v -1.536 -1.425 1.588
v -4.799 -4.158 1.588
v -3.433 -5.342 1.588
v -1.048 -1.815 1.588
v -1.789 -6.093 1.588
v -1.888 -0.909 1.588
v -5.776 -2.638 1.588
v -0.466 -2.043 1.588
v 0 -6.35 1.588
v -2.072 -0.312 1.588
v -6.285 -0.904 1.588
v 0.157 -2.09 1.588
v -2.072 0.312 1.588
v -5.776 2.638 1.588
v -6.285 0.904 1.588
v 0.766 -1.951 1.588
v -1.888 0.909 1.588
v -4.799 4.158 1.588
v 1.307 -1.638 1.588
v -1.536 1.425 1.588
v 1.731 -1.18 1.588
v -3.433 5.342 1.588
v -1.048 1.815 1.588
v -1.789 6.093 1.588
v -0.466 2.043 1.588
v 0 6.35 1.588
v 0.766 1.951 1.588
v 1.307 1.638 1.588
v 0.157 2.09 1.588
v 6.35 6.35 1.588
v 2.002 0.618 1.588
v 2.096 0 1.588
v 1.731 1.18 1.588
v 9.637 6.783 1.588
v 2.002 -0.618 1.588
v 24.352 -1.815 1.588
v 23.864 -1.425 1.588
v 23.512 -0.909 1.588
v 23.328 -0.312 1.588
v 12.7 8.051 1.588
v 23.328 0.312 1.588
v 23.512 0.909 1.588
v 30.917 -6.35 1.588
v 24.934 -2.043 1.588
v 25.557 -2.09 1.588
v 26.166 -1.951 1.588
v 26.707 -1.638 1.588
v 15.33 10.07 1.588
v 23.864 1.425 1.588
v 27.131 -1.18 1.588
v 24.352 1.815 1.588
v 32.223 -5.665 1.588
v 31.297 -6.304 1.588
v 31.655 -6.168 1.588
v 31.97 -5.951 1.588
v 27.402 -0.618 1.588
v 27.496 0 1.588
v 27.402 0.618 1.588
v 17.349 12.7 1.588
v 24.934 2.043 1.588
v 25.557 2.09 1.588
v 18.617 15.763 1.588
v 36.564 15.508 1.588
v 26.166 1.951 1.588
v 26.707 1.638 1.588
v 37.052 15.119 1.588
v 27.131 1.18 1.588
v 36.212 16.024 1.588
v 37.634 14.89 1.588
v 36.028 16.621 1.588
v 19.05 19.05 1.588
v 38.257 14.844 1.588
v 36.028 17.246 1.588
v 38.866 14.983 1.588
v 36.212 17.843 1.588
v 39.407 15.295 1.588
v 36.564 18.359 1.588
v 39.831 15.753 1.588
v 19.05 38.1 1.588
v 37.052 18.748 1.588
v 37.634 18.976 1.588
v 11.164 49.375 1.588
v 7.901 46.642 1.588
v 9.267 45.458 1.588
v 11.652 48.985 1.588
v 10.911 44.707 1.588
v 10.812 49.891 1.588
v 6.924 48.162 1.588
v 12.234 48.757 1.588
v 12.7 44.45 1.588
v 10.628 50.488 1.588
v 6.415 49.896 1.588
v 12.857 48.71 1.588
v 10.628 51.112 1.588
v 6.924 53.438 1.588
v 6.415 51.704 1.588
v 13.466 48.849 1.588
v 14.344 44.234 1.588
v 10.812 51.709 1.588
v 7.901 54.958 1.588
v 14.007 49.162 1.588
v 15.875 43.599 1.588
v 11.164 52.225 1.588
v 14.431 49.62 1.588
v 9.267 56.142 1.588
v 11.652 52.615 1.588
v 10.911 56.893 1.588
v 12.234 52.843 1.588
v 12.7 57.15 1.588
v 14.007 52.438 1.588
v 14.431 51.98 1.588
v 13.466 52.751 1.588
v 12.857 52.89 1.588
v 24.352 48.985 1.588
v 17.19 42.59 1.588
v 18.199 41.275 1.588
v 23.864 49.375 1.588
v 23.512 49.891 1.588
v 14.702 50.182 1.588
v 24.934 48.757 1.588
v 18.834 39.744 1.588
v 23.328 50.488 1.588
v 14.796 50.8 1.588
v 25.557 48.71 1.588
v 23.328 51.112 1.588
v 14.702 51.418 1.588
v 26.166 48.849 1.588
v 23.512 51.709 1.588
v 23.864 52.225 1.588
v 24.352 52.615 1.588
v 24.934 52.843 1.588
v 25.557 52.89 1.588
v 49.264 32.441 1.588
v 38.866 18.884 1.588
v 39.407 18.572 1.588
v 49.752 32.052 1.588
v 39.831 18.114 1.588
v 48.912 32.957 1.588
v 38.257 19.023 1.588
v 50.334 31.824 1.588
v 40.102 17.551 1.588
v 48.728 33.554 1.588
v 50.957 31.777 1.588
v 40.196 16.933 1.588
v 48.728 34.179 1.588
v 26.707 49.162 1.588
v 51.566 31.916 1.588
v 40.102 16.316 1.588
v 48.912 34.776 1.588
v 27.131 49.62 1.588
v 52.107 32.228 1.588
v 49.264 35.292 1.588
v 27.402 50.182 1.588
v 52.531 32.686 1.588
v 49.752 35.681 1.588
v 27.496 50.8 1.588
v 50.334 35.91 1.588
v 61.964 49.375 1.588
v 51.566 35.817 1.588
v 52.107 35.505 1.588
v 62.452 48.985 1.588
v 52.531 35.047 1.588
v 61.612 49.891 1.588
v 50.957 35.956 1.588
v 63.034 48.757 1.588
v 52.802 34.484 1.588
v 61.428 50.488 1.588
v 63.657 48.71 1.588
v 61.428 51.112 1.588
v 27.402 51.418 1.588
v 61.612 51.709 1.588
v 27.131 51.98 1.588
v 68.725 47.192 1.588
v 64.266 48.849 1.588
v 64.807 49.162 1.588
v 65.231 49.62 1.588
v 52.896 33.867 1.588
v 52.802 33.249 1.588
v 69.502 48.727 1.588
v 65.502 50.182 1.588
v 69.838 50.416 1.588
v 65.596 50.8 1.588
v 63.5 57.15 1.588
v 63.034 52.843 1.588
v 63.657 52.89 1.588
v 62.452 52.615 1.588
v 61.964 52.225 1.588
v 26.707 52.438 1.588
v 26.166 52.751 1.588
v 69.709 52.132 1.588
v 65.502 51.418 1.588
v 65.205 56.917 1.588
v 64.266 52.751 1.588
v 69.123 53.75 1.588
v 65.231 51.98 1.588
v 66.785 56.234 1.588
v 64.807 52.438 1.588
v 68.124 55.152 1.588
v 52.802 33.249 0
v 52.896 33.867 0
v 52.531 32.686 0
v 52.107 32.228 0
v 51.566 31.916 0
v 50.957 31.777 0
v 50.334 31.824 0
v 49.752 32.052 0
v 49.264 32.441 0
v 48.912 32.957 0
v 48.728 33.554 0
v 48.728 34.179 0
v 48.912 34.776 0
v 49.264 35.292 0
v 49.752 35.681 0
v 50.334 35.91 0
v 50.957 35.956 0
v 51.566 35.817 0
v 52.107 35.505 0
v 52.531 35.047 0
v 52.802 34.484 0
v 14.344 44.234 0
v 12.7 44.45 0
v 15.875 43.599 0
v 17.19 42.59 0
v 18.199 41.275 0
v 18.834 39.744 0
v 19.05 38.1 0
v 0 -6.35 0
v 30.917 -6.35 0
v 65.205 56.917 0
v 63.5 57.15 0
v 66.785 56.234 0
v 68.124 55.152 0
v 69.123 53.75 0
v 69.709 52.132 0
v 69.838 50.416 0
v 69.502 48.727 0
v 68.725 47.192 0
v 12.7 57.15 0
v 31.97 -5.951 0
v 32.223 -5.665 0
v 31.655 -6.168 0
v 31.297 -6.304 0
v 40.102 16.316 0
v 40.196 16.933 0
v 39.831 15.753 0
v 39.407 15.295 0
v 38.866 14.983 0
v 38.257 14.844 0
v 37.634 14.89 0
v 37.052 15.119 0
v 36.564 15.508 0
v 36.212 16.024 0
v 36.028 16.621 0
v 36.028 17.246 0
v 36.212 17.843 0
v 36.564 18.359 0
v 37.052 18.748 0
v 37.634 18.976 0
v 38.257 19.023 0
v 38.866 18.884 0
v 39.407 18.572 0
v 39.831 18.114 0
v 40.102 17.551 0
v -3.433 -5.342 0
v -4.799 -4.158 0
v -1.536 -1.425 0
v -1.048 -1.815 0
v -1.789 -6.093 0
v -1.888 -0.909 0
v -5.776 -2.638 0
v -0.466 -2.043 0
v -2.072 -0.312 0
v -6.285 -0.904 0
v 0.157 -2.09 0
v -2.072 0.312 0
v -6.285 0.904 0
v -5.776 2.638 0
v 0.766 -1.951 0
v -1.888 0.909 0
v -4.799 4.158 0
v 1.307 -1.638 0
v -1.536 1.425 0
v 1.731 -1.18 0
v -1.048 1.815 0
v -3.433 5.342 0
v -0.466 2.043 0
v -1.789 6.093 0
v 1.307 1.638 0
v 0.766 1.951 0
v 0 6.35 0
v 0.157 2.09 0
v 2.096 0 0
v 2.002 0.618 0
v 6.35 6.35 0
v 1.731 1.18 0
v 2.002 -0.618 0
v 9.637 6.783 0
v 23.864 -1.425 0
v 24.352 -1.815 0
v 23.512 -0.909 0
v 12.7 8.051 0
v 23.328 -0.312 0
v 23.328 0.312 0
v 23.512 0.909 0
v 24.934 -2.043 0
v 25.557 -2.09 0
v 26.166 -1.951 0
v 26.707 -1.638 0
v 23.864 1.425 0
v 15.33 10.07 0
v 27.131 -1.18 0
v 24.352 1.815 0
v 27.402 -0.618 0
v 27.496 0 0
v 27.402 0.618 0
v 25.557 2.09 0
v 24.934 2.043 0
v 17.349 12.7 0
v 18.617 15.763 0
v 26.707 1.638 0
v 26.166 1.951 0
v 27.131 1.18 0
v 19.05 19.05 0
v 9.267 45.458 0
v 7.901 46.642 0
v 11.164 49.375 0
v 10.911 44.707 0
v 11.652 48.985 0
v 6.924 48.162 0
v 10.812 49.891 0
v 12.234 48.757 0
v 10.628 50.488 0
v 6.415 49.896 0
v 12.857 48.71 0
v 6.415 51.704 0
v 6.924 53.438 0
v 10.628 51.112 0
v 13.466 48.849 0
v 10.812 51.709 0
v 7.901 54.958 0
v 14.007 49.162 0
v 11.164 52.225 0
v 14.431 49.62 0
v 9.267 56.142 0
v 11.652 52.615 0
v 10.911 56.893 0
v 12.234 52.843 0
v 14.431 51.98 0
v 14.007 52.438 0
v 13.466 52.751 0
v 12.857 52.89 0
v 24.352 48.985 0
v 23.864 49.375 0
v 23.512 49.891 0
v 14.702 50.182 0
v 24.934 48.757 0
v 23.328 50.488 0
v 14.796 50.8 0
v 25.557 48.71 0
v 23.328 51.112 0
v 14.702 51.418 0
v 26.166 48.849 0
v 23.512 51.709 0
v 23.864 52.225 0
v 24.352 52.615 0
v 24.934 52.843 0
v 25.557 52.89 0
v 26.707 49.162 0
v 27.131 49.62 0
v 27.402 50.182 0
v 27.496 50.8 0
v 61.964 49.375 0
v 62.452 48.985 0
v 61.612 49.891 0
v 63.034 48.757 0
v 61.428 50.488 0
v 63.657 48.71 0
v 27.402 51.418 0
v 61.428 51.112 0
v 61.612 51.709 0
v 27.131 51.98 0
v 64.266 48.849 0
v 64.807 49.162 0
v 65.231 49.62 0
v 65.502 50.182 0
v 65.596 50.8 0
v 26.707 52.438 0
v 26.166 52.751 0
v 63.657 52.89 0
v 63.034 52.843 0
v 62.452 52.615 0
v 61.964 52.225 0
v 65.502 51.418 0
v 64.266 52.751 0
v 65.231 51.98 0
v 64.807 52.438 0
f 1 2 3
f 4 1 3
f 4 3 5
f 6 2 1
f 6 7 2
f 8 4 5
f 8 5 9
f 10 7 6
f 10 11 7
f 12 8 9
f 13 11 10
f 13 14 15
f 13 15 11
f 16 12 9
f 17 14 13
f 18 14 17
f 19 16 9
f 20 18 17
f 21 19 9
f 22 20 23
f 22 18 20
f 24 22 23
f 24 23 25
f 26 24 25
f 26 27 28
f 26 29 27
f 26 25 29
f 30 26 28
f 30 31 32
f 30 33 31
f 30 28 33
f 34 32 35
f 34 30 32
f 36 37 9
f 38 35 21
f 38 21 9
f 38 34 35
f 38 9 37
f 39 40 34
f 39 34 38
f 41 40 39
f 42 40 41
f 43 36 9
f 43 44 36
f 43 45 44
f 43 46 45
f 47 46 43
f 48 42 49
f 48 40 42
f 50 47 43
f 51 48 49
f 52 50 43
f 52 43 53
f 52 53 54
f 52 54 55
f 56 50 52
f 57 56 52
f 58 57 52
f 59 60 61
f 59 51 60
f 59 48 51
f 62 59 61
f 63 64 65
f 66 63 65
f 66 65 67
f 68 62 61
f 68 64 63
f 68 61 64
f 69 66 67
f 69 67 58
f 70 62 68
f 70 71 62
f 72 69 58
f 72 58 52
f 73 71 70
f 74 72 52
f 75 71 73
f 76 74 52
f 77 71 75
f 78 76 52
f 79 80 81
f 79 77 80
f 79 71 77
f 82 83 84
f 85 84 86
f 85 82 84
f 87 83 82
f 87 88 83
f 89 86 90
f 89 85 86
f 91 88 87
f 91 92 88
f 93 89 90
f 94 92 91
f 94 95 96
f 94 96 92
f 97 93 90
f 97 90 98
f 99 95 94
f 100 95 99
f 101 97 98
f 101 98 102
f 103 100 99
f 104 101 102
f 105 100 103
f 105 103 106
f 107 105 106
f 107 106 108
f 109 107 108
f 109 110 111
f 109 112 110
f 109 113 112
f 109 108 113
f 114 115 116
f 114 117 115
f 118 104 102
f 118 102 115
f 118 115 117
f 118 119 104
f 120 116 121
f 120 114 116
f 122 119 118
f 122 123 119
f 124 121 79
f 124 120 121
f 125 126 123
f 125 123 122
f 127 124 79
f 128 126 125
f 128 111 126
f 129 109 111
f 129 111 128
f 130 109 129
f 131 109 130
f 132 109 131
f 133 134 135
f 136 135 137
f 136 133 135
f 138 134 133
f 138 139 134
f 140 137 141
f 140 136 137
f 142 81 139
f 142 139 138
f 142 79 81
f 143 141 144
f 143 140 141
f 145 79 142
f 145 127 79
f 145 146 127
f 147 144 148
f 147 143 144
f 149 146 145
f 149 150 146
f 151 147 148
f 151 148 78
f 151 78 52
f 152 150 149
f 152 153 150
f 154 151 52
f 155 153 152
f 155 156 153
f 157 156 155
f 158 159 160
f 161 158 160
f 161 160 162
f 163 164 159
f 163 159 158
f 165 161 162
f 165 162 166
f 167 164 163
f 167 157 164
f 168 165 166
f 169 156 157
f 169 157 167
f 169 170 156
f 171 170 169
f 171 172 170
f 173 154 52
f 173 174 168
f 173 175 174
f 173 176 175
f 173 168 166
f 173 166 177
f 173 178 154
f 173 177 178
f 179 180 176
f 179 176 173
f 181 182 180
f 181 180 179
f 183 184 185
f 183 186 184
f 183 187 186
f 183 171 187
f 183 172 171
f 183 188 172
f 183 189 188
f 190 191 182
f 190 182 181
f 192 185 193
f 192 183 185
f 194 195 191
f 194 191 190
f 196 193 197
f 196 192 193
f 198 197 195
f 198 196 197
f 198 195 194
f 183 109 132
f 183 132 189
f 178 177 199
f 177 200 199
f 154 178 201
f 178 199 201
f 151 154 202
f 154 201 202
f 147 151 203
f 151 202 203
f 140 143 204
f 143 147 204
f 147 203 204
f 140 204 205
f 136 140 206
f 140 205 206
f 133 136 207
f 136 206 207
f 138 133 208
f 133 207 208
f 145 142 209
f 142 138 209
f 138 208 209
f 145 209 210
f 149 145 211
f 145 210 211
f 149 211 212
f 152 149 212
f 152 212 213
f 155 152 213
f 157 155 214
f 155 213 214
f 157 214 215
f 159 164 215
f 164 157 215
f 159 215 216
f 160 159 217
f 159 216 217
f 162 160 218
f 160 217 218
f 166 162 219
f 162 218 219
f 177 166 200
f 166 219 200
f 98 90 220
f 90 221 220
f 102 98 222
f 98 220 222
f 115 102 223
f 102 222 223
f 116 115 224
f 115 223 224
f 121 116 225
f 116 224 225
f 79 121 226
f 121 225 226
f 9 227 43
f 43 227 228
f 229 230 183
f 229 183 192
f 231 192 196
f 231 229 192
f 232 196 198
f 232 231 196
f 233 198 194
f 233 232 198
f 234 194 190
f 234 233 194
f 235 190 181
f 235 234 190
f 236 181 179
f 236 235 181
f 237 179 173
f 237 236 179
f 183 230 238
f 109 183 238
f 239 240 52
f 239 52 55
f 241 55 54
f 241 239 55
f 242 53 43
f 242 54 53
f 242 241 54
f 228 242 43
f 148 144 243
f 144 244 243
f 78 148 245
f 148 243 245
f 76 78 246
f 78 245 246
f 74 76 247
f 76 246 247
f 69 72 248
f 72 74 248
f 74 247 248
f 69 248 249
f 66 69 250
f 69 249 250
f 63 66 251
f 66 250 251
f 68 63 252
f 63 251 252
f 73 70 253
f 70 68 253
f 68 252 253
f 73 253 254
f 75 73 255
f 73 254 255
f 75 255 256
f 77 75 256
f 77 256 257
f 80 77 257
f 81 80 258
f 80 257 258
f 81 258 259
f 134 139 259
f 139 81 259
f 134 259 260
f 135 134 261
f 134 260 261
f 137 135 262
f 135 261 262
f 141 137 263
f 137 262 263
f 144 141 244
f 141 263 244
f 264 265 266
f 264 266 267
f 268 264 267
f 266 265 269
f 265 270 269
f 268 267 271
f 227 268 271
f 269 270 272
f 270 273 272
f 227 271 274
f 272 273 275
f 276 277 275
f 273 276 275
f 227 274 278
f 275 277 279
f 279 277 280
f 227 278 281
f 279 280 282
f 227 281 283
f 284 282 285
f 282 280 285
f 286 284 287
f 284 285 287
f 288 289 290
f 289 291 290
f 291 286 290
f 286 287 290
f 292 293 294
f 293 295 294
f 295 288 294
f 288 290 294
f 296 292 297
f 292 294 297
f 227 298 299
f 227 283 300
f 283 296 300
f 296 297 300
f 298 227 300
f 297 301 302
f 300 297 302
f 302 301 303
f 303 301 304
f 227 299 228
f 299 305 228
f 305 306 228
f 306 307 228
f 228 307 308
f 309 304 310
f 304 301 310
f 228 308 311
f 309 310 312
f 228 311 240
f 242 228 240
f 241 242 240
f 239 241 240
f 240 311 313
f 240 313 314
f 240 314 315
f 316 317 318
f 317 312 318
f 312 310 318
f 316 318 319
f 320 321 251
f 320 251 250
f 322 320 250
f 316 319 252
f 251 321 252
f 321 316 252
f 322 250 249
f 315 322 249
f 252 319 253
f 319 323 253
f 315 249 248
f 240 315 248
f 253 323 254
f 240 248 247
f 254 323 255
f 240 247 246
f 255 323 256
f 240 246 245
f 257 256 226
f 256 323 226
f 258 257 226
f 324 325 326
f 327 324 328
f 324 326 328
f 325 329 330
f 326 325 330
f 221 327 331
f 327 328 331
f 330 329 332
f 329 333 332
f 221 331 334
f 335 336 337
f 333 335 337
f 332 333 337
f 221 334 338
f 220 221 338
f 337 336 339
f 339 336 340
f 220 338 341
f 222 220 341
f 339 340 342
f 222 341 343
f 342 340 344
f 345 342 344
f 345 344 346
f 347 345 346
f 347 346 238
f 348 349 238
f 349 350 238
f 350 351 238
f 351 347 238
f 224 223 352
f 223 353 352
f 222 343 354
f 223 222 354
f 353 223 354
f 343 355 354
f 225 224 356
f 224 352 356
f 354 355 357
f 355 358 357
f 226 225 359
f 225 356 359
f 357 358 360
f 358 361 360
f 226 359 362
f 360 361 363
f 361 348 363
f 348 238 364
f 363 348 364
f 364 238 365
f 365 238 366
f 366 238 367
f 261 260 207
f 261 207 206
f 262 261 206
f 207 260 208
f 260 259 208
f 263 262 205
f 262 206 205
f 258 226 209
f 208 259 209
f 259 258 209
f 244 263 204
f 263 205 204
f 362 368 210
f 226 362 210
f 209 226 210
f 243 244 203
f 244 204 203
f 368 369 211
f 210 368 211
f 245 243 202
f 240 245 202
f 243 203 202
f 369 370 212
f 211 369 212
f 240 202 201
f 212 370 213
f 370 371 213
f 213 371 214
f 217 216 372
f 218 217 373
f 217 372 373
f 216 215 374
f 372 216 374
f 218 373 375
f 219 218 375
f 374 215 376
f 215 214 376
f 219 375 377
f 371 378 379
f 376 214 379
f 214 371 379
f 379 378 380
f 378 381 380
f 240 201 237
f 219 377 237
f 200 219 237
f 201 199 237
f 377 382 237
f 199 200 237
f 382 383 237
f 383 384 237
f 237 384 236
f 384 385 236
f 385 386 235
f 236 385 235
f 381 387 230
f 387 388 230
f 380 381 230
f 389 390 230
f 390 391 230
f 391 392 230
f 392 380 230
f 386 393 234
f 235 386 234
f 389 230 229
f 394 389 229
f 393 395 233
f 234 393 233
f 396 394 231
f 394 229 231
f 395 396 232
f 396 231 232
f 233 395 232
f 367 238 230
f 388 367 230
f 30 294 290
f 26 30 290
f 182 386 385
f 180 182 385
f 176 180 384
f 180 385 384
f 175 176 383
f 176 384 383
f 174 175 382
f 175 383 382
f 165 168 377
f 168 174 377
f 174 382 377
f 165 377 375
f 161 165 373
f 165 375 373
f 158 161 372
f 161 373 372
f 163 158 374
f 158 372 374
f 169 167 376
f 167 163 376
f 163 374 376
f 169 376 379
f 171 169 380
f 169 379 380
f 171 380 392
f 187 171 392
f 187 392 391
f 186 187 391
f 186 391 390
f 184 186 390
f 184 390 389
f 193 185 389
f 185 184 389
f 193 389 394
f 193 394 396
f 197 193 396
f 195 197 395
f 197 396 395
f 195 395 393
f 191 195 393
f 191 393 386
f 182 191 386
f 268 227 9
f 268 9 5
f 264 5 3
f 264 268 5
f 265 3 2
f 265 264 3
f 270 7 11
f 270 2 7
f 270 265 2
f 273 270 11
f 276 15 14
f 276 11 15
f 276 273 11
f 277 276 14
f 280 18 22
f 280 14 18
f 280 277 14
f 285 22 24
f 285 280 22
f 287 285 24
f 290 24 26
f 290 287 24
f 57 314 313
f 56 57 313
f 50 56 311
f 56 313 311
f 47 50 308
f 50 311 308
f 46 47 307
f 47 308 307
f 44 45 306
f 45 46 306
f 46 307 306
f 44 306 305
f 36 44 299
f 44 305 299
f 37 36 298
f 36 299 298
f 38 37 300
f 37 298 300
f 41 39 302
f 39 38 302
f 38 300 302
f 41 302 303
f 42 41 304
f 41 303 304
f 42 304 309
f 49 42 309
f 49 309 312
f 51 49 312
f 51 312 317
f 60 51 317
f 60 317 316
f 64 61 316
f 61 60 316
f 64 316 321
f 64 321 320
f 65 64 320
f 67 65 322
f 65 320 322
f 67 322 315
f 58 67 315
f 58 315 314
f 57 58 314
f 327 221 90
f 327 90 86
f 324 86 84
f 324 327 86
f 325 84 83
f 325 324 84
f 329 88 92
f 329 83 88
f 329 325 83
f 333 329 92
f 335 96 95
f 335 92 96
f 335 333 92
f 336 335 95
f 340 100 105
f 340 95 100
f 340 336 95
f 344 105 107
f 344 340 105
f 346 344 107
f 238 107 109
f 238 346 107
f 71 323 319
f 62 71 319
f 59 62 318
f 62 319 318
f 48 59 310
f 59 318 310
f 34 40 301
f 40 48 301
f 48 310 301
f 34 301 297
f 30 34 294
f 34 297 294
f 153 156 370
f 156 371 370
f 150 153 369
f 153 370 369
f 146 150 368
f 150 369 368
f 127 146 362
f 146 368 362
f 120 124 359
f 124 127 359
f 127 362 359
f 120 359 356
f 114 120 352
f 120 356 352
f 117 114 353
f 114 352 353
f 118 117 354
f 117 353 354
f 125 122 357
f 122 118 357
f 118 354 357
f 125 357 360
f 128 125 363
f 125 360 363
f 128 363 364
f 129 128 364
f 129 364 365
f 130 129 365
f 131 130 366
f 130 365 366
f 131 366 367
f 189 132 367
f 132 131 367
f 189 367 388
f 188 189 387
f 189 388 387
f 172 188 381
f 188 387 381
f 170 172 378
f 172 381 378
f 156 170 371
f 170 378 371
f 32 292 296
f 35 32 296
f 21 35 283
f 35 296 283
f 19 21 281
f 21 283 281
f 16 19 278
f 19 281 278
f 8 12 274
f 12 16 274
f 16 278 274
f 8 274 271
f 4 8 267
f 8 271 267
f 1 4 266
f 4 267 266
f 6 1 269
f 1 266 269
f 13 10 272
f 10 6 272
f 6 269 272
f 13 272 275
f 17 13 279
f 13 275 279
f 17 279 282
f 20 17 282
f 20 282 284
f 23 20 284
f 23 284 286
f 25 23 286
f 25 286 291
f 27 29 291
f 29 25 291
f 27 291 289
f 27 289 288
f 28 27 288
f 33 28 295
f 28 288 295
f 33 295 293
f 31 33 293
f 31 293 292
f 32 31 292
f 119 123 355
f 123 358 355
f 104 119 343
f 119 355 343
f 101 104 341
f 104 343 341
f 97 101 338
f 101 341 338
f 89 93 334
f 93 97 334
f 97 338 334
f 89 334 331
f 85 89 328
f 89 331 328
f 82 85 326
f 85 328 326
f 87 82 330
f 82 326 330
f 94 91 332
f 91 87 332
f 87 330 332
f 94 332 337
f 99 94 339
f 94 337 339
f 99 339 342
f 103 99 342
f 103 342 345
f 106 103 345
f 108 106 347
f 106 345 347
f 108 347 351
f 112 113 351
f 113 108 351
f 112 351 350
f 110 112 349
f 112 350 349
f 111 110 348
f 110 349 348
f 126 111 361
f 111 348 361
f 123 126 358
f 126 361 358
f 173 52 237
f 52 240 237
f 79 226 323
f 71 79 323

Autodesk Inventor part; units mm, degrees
ref_plane "YZ Plane" through (0, 0, 0) normal (1, 0, 0) x (0, 1, 0)
ref_plane "XZ Plane" through (0, 0, 0) normal (0, 1, 0) x (-1, 0, 0)
ref_plane "XY Plane" through (0, 0, 0) normal (0, 0, 1) x (1, 0, 0)
sketch "main" plane through (0, 0, 0) normal (0, 0, 1) x (1, 0, 0)
  circle A0 centre (-11.3817, -22.2219) radius 2.0955
  circle A1 centre (-11.3817, 28.5781) radius 2.0955
  circle A2 centre (-24.0817, 28.5781) radius 2.0955
  arc A3 (-24.0817, 34.9281) -> (-24.0817, 22.2281) centre (-24.0817, 28.5781) ccw
  line L0 (-4.5584, -27.8865) -> (31.9434, 24.9697)
  line L1 (26.7183, 34.9281) -> (-24.0817, 34.9281)
  arc A4 (31.9434, 24.9697) -> (26.7183, 34.9281) centre (26.7183, 28.5781) ccw
  circle A5 centre (26.7183, 28.5781) radius 2.0955
  arc A6 (-5.8647, -28.5719) -> (-4.5584, -27.8865) centre (-5.8647, -26.9844) ccw
  line L2 (-36.7817, -15.8719) -> (-36.7817, -15.8719)
  line L3 (-36.7817, -28.5719) -> (-5.8647, -28.5719)
  circle A7 centre (-36.7817, -22.2219) radius 2.0955
  arc A8 (-36.7817, -15.8719) -> (-36.7817, -28.5719) centre (-36.7817, -22.2219) ccw
  line L4 (-17.7317, 15.8781) -> (-17.7317, -3.1719)
  line L5 (-30.4317, -15.8719) -> (-36.7817, -15.8719)
  line L6 (-24.0817, 22.2281) -> (-24.0817, 22.2281)
  arc A9 (-17.7317, 15.8781) -> (-24.0817, 22.2281) centre (-24.0817, 15.8781) ccw
  arc A10 (-30.4317, -15.8719) -> (-17.7317, -3.1719) centre (-30.4317, -3.1719) ccw
  circle A11 centre (1.3183, -5.2886) radius 2.0955
  circle A12 centre (14.0183, 11.6448) radius 2.0955
  point P0 (-15.5195, 2.5641)
  point P1 (-17.7317, 22.2281)
  dimension "d0" = 4.191
  dimension "d1" = 4.191
  dimension "d4" = 1.5875
  dimension "d7" = 6.35
  dimension "d8" = 12.7
  dimension "d11" = 4.191
  dimension "d13" = 4.191
sketch "Sketch1" plane through (0, 0, 0) normal (0, 0, 1) x (1, 0, 0)
  circle A0 centre (25.4, 0) radius 2.0955
  circle A1 centre (25.4, 50.8) radius 2.0955
  circle A2 centre (12.7, 50.8) radius 2.0955
  arc A3 (12.7, 57.15) -> (12.7, 44.45) centre (12.7, 50.8) ccw
  line L0 (32.2233, -5.6646) -> (68.7251, 47.1916)
  line L1 (63.5, 57.15) -> (12.7, 57.15)
  arc A4 (68.7251, 47.1916) -> (63.5, 57.15) centre (63.5, 50.8) ccw
  circle A5 centre (63.5, 50.8) radius 2.0955
  arc A6 (30.917, -6.35) -> (32.2233, -5.6646) centre (30.917, -4.7625) ccw
  line L2 (0, 6.35) -> (0, 6.35)
  line L3 (0, -6.35) -> (30.917, -6.35)
  circle A7 centre (0, 0) radius 2.0955
  arc A8 (0, 6.35) -> (0, -6.35) centre (0, 0) ccw
  line L4 (19.05, 38.1) -> (19.05, 19.05)
  line L5 (6.35, 6.35) -> (0, 6.35)
  line L6 (12.7, 44.45) -> (12.7, 44.45)
  arc A9 (19.05, 38.1) -> (12.7, 44.45) centre (12.7, 38.1) ccw
  arc A10 (6.35, 6.35) -> (19.05, 19.05) centre (6.35, 19.05) ccw
  circle A11 centre (38.1, 16.9333) radius 2.0955
  circle A12 centre (50.8, 33.8667) radius 2.0955
extrude "Extrusion1" add sketch "Sketch1" along normal blind 1.5875
equation "\"BendRadius\" = Thickness"
equation "\"BendReliefWidth\" = Thickness"
equation "\"BendReliefDepth\" = 0.5 * Thickness"
equation "\"CornerReliefSize\" = 4 * Thickness"
equation "\"MinimumRemnant\" = 2 * Thickness"
equation "\"TransitionRadius\" = BendRadius"
equation "\"JacobiRadiusSize\" = BendRadius"
equation "\"GapSize\" = Thickness"
equation "\"Thickness\" = 1.5875"
properties part number "gusset" material "Acetal Resin, White"
